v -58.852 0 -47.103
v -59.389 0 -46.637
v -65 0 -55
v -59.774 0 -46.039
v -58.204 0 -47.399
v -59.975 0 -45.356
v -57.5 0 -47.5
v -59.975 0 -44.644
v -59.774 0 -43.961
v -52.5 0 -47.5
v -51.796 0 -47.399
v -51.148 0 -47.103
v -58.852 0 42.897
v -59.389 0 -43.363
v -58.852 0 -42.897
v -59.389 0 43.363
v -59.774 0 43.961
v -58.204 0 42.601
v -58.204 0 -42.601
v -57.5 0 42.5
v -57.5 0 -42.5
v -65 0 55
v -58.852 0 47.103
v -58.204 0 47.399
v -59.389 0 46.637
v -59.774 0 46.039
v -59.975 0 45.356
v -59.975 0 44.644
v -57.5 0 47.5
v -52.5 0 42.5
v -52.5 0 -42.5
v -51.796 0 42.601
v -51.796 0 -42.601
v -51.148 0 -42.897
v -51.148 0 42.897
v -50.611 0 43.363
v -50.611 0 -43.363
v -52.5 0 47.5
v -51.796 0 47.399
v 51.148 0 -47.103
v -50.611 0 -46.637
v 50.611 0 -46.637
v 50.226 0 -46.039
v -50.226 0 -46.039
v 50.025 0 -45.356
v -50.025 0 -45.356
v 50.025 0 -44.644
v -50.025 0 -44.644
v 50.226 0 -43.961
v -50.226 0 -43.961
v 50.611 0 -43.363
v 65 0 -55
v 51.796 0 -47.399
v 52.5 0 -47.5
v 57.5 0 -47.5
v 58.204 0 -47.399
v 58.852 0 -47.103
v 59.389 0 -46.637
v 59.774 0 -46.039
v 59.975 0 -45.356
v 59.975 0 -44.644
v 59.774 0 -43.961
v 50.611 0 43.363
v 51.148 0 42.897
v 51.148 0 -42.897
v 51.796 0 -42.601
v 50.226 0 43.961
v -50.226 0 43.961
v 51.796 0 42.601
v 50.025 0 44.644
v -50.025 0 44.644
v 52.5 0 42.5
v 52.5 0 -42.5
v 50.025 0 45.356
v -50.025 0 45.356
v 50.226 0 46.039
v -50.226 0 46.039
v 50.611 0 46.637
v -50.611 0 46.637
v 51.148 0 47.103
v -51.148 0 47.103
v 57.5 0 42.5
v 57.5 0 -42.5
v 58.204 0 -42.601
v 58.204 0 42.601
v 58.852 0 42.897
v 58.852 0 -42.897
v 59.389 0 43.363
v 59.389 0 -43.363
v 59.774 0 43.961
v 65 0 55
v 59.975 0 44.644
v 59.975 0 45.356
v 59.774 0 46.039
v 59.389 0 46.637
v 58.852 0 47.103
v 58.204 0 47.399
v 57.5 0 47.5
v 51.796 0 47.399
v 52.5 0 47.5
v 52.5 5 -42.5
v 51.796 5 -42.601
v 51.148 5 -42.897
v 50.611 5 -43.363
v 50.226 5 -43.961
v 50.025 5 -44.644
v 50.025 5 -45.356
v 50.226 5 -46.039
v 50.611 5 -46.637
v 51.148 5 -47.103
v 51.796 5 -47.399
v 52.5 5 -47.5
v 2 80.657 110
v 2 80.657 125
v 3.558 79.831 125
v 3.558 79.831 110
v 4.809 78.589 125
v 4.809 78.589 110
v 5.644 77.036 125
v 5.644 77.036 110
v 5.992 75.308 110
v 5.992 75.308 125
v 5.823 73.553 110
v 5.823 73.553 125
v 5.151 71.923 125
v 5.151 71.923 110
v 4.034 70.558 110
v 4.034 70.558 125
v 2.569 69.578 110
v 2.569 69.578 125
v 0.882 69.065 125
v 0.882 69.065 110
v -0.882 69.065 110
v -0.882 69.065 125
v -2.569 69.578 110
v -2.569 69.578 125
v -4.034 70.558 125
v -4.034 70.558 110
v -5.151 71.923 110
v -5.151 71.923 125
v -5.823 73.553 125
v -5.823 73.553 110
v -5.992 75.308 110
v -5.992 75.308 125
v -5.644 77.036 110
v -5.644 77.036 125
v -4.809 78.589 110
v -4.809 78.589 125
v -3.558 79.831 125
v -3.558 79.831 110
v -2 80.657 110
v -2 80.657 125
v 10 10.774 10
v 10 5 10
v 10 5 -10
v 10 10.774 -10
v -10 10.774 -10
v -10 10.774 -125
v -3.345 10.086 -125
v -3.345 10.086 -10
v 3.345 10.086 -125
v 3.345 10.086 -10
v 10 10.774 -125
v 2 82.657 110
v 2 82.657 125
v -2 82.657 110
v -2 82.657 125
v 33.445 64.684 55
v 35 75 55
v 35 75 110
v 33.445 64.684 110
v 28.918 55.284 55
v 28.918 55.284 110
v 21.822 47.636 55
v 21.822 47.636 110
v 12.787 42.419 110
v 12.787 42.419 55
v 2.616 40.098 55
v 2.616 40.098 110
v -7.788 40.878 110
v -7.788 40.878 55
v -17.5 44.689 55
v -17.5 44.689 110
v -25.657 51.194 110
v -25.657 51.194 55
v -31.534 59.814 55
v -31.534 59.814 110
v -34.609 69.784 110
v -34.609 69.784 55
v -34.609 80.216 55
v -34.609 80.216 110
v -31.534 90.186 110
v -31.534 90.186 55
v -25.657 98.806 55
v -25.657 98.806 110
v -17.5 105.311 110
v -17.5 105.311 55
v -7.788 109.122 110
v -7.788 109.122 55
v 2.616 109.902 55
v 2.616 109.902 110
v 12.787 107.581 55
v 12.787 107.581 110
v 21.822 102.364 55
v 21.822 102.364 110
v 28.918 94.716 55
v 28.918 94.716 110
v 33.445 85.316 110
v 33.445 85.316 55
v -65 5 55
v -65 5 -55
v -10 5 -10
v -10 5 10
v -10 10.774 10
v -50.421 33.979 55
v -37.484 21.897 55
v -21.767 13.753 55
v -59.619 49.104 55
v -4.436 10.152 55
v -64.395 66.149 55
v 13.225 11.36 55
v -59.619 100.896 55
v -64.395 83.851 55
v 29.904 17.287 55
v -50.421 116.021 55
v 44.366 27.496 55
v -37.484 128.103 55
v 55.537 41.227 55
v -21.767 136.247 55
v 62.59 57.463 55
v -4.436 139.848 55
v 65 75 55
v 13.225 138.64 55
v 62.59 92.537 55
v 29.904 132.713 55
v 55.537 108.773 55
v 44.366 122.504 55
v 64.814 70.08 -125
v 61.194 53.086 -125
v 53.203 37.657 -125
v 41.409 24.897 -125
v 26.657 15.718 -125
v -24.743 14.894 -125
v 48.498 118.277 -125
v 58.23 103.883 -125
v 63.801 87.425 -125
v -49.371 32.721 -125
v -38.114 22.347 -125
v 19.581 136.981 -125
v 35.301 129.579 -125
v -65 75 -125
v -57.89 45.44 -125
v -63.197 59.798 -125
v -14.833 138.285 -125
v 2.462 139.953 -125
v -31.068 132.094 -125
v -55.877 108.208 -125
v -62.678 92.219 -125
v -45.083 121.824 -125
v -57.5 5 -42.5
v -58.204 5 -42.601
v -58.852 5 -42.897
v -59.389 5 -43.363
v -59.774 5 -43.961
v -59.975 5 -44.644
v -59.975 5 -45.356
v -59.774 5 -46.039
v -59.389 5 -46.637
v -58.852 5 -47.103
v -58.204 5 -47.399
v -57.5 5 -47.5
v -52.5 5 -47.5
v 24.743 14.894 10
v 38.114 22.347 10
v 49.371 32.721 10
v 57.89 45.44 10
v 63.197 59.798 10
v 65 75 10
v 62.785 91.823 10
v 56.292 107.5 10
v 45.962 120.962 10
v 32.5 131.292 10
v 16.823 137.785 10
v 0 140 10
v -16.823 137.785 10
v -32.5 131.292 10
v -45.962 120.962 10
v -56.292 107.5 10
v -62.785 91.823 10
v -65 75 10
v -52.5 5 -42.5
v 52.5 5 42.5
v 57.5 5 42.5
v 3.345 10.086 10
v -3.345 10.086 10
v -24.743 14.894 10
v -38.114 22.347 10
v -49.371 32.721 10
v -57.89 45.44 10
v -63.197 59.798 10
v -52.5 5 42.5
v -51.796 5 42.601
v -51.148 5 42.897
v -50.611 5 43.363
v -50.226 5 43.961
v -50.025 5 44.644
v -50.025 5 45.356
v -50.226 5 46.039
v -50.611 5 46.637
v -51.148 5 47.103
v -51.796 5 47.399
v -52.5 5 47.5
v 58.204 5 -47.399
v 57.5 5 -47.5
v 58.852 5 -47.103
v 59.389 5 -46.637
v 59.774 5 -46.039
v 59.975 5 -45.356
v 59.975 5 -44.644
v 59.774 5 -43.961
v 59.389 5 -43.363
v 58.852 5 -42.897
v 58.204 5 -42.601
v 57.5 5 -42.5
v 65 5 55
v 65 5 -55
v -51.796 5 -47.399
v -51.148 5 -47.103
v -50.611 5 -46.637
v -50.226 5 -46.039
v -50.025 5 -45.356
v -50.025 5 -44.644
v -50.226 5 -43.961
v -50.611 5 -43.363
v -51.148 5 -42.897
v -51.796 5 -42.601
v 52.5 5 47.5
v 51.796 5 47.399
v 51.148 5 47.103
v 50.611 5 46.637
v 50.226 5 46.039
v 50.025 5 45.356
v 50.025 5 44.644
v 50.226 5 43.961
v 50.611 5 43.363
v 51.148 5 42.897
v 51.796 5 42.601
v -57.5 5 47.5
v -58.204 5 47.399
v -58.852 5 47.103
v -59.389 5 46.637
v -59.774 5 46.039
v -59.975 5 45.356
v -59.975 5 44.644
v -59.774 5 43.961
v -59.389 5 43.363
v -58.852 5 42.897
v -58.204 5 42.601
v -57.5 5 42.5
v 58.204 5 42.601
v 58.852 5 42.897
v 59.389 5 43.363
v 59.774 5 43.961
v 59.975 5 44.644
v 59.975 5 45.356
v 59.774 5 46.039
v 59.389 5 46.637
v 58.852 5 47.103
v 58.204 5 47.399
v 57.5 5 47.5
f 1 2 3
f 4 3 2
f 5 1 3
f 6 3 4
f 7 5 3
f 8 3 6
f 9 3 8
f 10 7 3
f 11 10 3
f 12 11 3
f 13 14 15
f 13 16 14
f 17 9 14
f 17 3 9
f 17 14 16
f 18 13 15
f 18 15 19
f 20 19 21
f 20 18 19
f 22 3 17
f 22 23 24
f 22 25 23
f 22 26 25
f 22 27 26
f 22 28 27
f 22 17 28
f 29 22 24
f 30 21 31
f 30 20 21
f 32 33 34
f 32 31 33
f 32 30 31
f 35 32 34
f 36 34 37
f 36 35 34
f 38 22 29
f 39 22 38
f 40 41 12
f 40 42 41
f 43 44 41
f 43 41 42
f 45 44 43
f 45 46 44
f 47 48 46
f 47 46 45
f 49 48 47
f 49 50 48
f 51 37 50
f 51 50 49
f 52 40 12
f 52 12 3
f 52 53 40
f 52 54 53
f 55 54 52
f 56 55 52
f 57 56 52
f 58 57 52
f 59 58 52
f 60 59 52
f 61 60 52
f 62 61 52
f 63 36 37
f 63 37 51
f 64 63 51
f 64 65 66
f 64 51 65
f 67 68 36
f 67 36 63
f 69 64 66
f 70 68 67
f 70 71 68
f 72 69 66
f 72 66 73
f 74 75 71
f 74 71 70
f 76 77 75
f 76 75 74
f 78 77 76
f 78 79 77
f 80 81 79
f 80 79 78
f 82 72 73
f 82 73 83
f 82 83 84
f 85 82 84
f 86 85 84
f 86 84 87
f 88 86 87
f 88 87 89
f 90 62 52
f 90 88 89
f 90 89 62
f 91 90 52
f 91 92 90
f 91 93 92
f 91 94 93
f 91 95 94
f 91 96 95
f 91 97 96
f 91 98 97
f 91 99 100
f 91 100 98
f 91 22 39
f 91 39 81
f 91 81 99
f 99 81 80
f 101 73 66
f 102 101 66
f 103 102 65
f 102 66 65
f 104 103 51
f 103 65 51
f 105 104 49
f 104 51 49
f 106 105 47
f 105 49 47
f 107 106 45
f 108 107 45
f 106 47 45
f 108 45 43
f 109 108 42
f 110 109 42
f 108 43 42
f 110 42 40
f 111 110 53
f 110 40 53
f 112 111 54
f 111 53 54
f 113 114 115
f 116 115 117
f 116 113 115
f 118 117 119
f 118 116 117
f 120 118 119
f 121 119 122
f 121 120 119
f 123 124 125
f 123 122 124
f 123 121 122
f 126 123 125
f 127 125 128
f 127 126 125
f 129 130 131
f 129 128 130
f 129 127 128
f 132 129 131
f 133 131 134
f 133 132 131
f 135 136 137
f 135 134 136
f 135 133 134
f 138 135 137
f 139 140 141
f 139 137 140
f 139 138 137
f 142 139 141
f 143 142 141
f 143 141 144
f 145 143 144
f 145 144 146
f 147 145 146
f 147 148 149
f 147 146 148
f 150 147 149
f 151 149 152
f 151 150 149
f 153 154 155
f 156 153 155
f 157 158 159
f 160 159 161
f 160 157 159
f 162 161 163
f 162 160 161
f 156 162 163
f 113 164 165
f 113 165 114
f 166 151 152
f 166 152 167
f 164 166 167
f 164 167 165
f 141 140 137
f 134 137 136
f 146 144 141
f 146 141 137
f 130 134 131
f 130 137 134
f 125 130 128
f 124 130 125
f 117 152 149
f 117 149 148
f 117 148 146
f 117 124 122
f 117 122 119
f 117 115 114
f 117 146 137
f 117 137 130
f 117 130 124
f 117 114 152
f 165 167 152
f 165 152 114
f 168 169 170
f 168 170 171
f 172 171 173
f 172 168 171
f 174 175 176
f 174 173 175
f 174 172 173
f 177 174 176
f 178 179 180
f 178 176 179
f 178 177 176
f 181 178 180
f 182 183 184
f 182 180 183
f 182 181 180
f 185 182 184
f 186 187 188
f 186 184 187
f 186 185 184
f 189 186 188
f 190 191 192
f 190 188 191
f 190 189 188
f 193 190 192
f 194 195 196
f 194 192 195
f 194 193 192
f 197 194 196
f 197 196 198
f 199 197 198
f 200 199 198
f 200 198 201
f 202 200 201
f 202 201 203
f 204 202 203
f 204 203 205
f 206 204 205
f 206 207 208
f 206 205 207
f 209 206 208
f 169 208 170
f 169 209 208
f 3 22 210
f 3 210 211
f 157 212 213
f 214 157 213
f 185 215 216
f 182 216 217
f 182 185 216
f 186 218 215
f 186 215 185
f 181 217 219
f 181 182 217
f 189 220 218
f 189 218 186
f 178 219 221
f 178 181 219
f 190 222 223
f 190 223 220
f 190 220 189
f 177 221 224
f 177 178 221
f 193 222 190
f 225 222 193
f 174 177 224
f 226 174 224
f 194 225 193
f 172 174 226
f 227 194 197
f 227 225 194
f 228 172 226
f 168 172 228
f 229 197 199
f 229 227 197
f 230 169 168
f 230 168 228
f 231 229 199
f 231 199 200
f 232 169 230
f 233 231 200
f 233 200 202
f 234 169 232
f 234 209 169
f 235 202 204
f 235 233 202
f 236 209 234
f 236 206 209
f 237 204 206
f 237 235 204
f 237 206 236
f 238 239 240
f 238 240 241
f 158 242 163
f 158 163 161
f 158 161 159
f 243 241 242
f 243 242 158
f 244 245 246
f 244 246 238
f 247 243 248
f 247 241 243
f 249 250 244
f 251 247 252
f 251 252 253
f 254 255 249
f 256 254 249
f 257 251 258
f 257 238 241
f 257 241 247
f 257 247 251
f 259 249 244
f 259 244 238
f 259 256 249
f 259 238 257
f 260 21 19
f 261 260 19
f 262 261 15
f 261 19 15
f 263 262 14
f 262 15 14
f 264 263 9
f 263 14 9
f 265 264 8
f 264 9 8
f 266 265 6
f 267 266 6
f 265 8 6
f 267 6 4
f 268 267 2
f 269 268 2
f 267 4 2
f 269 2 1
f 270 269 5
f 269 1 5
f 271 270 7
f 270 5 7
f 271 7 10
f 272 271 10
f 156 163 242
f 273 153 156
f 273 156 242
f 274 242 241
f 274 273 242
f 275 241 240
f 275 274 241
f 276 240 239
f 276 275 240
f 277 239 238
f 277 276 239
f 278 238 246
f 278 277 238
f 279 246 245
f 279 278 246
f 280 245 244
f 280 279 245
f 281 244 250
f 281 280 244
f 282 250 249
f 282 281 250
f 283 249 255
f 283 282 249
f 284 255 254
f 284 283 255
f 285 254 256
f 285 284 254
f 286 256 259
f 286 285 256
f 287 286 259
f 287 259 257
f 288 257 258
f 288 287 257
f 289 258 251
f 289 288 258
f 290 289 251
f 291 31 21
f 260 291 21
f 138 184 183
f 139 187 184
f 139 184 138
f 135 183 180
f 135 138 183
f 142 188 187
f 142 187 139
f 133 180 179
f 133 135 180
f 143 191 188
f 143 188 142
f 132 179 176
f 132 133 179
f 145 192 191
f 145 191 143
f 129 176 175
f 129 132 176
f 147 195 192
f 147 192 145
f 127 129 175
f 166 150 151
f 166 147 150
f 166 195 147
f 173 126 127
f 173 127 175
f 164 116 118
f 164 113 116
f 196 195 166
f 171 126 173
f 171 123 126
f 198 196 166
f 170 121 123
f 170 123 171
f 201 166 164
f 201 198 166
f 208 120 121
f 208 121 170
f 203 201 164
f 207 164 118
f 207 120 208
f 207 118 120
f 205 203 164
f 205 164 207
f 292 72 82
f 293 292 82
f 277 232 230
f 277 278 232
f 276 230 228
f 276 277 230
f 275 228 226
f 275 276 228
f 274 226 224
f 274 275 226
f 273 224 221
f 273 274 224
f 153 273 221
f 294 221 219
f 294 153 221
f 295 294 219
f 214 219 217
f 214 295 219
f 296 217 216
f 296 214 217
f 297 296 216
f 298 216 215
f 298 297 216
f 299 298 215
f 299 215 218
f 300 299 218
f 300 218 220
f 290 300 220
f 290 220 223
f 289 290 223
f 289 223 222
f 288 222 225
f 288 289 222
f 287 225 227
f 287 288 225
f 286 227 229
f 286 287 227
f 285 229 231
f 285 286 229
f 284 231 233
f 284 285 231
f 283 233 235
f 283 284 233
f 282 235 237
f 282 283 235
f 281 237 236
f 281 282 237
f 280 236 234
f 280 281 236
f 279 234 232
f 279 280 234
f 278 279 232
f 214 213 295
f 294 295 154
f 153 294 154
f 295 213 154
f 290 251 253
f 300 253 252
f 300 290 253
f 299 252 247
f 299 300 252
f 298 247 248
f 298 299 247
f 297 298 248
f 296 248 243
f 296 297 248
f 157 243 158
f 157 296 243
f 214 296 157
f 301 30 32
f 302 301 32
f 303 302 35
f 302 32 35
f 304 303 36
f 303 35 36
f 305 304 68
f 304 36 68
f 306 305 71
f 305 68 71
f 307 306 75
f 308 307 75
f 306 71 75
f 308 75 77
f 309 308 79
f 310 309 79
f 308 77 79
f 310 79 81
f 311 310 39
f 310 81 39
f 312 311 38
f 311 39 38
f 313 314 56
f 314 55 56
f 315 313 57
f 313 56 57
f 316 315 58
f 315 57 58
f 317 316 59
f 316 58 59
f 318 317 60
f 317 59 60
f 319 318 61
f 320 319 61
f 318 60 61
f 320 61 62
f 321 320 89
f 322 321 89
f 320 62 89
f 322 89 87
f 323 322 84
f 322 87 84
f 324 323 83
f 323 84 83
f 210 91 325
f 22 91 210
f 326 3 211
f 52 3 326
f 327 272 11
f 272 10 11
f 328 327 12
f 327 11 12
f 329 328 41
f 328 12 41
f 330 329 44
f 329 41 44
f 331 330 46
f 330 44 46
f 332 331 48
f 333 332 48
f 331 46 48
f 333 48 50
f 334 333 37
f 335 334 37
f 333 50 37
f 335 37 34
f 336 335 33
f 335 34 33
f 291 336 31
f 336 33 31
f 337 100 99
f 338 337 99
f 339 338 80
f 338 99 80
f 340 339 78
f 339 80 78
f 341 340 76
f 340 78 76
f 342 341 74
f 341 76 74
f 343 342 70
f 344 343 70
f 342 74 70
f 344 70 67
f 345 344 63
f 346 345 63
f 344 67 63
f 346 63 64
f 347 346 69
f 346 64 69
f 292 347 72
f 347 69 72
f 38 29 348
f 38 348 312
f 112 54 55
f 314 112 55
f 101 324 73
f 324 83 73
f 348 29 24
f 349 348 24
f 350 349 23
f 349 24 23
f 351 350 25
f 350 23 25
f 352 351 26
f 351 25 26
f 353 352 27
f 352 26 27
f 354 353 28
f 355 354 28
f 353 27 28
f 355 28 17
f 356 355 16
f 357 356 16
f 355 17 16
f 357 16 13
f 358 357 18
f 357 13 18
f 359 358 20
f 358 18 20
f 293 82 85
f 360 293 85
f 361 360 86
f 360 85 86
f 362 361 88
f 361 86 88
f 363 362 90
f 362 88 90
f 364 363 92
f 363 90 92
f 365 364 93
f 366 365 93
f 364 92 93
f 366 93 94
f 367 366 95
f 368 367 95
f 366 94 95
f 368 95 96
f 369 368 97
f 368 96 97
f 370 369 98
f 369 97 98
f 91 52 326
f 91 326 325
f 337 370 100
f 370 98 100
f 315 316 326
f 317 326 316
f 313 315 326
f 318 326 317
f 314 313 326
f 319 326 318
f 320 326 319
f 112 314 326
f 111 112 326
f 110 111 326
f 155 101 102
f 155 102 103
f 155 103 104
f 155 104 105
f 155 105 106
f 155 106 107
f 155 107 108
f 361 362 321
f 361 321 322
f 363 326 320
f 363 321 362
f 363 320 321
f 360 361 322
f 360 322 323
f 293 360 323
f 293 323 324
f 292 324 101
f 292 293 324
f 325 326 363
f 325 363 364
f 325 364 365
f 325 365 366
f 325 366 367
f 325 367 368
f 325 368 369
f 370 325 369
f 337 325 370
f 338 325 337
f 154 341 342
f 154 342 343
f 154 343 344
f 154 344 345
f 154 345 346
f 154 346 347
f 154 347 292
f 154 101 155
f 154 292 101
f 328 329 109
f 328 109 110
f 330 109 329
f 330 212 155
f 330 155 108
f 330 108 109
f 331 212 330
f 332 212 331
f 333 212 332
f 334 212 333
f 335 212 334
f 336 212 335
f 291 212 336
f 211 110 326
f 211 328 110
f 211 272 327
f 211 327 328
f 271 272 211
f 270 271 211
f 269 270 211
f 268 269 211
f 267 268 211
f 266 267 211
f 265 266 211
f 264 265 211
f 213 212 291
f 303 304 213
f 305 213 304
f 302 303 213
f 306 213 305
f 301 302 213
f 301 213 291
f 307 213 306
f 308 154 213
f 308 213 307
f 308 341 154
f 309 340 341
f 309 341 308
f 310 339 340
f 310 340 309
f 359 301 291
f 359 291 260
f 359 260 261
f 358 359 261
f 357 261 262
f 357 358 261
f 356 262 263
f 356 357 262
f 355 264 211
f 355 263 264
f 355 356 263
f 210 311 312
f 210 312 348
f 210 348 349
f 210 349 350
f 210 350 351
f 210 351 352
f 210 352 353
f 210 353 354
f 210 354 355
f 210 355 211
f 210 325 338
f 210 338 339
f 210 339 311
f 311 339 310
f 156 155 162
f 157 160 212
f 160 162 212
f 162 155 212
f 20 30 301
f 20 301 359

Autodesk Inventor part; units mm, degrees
ref_plane "YZ Plane" through (0, 0, 0) normal (1, 0, 0) x (0, 1, 0)
ref_plane "XZ Plane" through (0, 0, 0) normal (0, 1, 0) x (-1, 0, 0)
ref_plane "XY Plane" through (0, 0, 0) normal (0, 0, 1) x (1, 0, 0)
sketch "Sketch1" plane through (0, 0, 0) normal (0, 1, 0) x (-1, 0, 0)
  line L0 (-70.0685, 0) -> (70.0685, 0) construction
  line L1 (0, -20.6438) -> (0, 20.6438) construction
  line L2 (65, -55) -> (-65, -55)
  line L3 (-65, -55) -> (-65, 55)
  line L4 (-65, 55) -> (65, 55)
  line L5 (65, 55) -> (65, -55)
  point P0 (0, 0)
  point P1 (0, 0)
  dimension "d0" = 110
  dimension "d1" = 130
extrude "Extrusion1" add sketch "Sketch1" along normal blind 5
sketch "Sketch2" plane through (0, 0, 0) normal (0, -1, 0) x (1, 0, 0)
  line L0 (-160.533, 0) -> (160.533, 0) construction
  line L1 (0, 8.6003) -> (0, -8.6003) construction
  line L2 (-57.5, 45) -> (-52.5, 45) construction
  line L3 (-57.5, 47.5) -> (-52.5, 47.5)
  line L4 (-52.5, 42.5) -> (-57.5, 42.5)
  arc A0 (-57.5, 47.5) -> (-57.5, 42.5) centre (-57.5, 45) ccw
  arc A1 (-52.5, 42.5) -> (-52.5, 47.5) centre (-52.5, 45) ccw
  line L5 (57.5, 45) -> (52.5, 45) construction
  line L6 (57.5, 47.5) -> (52.5, 47.5)
  line L7 (52.5, 42.5) -> (57.5, 42.5)
  arc A2 (57.5, 42.5) -> (57.5, 47.5) centre (57.5, 45) ccw
  arc A3 (52.5, 47.5) -> (52.5, 42.5) centre (52.5, 45) ccw
  line L8 (57.5, -45) -> (52.5, -45) construction
  line L9 (57.5, -42.5) -> (52.5, -42.5)
  line L10 (52.5, -47.5) -> (57.5, -47.5)
  arc A4 (57.5, -47.5) -> (57.5, -42.5) centre (57.5, -45) ccw
  arc A5 (52.5, -42.5) -> (52.5, -47.5) centre (52.5, -45) ccw
  line L11 (-57.5, -45) -> (-52.5, -45) construction
  line L12 (-57.5, -47.5) -> (-52.5, -47.5)
  line L13 (-52.5, -42.5) -> (-57.5, -42.5)
  arc A6 (-57.5, -42.5) -> (-57.5, -47.5) centre (-57.5, -45) ccw
  arc A7 (-52.5, -47.5) -> (-52.5, -42.5) centre (-52.5, -45) ccw
  point P0 (0, 0)
  point P1 (-55, 45)
  point P2 (55, 45)
  point P3 (55, -45)
  point P4 (-55, -45)
  point P5 (0, 0)
  point P6 (-60, 45)
  point P7 (-50, 45)
  dimension "d4" = 110
  dimension "d5" = 90
  dimension "d7" = 5
  dimension "d8" = 10
extrude "Extrusion2" cut sketch "Sketch2" against normal through all
sketch "Sketch3" plane through (0, 0, 0) normal (0, -1, 0) x (1, 0, 0)
  line L0 (-38.6076, 0) -> (38.6076, 0) construction
  line L1 (0, -3.4177) -> (0, 3.4177) construction
  line L2 (10, -10) -> (-10, -10)
  line L3 (-10, -10) -> (-10, 10)
  line L4 (-10, 10) -> (10, 10)
  line L5 (10, 10) -> (10, -10)
  point P0 (0, 0)
  point P1 (0, 0)
  dimension "d11" = 20
  dimension "d12" = 20
extrude "Extrusion3" add sketch "Sketch3" against normal blind 75
sketch "Sketch4" plane through (-10, 5, 10) normal (0, 0, 1) x (1, 0, 0)
  line L0 (20, 70) -> (0, 70) projected
  circle A0 centre (10, 70) radius 65
  point P0 (10, -5)
  dimension "d15" = 130
extrude "Extrusion4" add sketch "Sketch4" along normal up to surface (45 mm away)
sketch "Sketch5" plane through (0, 75, 55) normal (0, 0, 1) x (1, 0, 0)
  line L0 (10, 0) -> (-10, 0) projected
  circle A0 centre (0, 0) radius 35
  point P0 (0, -75)
  dimension "d18" = 70
extrude "Extrusion5" add sketch "Sketch5" along normal blind 55
sketch "Sketch6" plane through (0, 75, 110) normal (0, 0, 1) x (1, 0, 0)
  arc A0 (-2, 5.6569) -> (2, 5.6569) centre (0, 0) ccw
  circle A1 centre (0, 0) radius 35 projected
  line L0 (-2, 7.6569) -> (2, 7.6569)
  line L1 (2, 7.6569) -> (2, 5.6569)
  line L2 (-2, 5.6569) -> (-2, 7.6569)
  point P0 (0, -75)
  dimension "d21" = 12
  dimension "d23" = 2
  dimension "d26" = 4
  dimension "d27" = 2
extrude "Extrusion6" add sketch "Sketch6" along normal blind 15 contours L2 L0 L1 A0
sketch "Sketch8" plane through (-10, 5, 10) normal (0, 0, -1) x (-1, 0, 0)
  arc A0 (-12, 75.6569) -> (-8, 75.6569) centre (-10, 70) ccw projected
  circle A1 centre (-10, 70) radius 65
  arc A2 (0, 5.7738) -> (-20, 5.7738) centre (-10, 70) ccw projected
  point P0 (-10, -5)
extrude "Extrusion7" add sketch "Sketch8" along normal blind 135
properties part number "MotorV1"
